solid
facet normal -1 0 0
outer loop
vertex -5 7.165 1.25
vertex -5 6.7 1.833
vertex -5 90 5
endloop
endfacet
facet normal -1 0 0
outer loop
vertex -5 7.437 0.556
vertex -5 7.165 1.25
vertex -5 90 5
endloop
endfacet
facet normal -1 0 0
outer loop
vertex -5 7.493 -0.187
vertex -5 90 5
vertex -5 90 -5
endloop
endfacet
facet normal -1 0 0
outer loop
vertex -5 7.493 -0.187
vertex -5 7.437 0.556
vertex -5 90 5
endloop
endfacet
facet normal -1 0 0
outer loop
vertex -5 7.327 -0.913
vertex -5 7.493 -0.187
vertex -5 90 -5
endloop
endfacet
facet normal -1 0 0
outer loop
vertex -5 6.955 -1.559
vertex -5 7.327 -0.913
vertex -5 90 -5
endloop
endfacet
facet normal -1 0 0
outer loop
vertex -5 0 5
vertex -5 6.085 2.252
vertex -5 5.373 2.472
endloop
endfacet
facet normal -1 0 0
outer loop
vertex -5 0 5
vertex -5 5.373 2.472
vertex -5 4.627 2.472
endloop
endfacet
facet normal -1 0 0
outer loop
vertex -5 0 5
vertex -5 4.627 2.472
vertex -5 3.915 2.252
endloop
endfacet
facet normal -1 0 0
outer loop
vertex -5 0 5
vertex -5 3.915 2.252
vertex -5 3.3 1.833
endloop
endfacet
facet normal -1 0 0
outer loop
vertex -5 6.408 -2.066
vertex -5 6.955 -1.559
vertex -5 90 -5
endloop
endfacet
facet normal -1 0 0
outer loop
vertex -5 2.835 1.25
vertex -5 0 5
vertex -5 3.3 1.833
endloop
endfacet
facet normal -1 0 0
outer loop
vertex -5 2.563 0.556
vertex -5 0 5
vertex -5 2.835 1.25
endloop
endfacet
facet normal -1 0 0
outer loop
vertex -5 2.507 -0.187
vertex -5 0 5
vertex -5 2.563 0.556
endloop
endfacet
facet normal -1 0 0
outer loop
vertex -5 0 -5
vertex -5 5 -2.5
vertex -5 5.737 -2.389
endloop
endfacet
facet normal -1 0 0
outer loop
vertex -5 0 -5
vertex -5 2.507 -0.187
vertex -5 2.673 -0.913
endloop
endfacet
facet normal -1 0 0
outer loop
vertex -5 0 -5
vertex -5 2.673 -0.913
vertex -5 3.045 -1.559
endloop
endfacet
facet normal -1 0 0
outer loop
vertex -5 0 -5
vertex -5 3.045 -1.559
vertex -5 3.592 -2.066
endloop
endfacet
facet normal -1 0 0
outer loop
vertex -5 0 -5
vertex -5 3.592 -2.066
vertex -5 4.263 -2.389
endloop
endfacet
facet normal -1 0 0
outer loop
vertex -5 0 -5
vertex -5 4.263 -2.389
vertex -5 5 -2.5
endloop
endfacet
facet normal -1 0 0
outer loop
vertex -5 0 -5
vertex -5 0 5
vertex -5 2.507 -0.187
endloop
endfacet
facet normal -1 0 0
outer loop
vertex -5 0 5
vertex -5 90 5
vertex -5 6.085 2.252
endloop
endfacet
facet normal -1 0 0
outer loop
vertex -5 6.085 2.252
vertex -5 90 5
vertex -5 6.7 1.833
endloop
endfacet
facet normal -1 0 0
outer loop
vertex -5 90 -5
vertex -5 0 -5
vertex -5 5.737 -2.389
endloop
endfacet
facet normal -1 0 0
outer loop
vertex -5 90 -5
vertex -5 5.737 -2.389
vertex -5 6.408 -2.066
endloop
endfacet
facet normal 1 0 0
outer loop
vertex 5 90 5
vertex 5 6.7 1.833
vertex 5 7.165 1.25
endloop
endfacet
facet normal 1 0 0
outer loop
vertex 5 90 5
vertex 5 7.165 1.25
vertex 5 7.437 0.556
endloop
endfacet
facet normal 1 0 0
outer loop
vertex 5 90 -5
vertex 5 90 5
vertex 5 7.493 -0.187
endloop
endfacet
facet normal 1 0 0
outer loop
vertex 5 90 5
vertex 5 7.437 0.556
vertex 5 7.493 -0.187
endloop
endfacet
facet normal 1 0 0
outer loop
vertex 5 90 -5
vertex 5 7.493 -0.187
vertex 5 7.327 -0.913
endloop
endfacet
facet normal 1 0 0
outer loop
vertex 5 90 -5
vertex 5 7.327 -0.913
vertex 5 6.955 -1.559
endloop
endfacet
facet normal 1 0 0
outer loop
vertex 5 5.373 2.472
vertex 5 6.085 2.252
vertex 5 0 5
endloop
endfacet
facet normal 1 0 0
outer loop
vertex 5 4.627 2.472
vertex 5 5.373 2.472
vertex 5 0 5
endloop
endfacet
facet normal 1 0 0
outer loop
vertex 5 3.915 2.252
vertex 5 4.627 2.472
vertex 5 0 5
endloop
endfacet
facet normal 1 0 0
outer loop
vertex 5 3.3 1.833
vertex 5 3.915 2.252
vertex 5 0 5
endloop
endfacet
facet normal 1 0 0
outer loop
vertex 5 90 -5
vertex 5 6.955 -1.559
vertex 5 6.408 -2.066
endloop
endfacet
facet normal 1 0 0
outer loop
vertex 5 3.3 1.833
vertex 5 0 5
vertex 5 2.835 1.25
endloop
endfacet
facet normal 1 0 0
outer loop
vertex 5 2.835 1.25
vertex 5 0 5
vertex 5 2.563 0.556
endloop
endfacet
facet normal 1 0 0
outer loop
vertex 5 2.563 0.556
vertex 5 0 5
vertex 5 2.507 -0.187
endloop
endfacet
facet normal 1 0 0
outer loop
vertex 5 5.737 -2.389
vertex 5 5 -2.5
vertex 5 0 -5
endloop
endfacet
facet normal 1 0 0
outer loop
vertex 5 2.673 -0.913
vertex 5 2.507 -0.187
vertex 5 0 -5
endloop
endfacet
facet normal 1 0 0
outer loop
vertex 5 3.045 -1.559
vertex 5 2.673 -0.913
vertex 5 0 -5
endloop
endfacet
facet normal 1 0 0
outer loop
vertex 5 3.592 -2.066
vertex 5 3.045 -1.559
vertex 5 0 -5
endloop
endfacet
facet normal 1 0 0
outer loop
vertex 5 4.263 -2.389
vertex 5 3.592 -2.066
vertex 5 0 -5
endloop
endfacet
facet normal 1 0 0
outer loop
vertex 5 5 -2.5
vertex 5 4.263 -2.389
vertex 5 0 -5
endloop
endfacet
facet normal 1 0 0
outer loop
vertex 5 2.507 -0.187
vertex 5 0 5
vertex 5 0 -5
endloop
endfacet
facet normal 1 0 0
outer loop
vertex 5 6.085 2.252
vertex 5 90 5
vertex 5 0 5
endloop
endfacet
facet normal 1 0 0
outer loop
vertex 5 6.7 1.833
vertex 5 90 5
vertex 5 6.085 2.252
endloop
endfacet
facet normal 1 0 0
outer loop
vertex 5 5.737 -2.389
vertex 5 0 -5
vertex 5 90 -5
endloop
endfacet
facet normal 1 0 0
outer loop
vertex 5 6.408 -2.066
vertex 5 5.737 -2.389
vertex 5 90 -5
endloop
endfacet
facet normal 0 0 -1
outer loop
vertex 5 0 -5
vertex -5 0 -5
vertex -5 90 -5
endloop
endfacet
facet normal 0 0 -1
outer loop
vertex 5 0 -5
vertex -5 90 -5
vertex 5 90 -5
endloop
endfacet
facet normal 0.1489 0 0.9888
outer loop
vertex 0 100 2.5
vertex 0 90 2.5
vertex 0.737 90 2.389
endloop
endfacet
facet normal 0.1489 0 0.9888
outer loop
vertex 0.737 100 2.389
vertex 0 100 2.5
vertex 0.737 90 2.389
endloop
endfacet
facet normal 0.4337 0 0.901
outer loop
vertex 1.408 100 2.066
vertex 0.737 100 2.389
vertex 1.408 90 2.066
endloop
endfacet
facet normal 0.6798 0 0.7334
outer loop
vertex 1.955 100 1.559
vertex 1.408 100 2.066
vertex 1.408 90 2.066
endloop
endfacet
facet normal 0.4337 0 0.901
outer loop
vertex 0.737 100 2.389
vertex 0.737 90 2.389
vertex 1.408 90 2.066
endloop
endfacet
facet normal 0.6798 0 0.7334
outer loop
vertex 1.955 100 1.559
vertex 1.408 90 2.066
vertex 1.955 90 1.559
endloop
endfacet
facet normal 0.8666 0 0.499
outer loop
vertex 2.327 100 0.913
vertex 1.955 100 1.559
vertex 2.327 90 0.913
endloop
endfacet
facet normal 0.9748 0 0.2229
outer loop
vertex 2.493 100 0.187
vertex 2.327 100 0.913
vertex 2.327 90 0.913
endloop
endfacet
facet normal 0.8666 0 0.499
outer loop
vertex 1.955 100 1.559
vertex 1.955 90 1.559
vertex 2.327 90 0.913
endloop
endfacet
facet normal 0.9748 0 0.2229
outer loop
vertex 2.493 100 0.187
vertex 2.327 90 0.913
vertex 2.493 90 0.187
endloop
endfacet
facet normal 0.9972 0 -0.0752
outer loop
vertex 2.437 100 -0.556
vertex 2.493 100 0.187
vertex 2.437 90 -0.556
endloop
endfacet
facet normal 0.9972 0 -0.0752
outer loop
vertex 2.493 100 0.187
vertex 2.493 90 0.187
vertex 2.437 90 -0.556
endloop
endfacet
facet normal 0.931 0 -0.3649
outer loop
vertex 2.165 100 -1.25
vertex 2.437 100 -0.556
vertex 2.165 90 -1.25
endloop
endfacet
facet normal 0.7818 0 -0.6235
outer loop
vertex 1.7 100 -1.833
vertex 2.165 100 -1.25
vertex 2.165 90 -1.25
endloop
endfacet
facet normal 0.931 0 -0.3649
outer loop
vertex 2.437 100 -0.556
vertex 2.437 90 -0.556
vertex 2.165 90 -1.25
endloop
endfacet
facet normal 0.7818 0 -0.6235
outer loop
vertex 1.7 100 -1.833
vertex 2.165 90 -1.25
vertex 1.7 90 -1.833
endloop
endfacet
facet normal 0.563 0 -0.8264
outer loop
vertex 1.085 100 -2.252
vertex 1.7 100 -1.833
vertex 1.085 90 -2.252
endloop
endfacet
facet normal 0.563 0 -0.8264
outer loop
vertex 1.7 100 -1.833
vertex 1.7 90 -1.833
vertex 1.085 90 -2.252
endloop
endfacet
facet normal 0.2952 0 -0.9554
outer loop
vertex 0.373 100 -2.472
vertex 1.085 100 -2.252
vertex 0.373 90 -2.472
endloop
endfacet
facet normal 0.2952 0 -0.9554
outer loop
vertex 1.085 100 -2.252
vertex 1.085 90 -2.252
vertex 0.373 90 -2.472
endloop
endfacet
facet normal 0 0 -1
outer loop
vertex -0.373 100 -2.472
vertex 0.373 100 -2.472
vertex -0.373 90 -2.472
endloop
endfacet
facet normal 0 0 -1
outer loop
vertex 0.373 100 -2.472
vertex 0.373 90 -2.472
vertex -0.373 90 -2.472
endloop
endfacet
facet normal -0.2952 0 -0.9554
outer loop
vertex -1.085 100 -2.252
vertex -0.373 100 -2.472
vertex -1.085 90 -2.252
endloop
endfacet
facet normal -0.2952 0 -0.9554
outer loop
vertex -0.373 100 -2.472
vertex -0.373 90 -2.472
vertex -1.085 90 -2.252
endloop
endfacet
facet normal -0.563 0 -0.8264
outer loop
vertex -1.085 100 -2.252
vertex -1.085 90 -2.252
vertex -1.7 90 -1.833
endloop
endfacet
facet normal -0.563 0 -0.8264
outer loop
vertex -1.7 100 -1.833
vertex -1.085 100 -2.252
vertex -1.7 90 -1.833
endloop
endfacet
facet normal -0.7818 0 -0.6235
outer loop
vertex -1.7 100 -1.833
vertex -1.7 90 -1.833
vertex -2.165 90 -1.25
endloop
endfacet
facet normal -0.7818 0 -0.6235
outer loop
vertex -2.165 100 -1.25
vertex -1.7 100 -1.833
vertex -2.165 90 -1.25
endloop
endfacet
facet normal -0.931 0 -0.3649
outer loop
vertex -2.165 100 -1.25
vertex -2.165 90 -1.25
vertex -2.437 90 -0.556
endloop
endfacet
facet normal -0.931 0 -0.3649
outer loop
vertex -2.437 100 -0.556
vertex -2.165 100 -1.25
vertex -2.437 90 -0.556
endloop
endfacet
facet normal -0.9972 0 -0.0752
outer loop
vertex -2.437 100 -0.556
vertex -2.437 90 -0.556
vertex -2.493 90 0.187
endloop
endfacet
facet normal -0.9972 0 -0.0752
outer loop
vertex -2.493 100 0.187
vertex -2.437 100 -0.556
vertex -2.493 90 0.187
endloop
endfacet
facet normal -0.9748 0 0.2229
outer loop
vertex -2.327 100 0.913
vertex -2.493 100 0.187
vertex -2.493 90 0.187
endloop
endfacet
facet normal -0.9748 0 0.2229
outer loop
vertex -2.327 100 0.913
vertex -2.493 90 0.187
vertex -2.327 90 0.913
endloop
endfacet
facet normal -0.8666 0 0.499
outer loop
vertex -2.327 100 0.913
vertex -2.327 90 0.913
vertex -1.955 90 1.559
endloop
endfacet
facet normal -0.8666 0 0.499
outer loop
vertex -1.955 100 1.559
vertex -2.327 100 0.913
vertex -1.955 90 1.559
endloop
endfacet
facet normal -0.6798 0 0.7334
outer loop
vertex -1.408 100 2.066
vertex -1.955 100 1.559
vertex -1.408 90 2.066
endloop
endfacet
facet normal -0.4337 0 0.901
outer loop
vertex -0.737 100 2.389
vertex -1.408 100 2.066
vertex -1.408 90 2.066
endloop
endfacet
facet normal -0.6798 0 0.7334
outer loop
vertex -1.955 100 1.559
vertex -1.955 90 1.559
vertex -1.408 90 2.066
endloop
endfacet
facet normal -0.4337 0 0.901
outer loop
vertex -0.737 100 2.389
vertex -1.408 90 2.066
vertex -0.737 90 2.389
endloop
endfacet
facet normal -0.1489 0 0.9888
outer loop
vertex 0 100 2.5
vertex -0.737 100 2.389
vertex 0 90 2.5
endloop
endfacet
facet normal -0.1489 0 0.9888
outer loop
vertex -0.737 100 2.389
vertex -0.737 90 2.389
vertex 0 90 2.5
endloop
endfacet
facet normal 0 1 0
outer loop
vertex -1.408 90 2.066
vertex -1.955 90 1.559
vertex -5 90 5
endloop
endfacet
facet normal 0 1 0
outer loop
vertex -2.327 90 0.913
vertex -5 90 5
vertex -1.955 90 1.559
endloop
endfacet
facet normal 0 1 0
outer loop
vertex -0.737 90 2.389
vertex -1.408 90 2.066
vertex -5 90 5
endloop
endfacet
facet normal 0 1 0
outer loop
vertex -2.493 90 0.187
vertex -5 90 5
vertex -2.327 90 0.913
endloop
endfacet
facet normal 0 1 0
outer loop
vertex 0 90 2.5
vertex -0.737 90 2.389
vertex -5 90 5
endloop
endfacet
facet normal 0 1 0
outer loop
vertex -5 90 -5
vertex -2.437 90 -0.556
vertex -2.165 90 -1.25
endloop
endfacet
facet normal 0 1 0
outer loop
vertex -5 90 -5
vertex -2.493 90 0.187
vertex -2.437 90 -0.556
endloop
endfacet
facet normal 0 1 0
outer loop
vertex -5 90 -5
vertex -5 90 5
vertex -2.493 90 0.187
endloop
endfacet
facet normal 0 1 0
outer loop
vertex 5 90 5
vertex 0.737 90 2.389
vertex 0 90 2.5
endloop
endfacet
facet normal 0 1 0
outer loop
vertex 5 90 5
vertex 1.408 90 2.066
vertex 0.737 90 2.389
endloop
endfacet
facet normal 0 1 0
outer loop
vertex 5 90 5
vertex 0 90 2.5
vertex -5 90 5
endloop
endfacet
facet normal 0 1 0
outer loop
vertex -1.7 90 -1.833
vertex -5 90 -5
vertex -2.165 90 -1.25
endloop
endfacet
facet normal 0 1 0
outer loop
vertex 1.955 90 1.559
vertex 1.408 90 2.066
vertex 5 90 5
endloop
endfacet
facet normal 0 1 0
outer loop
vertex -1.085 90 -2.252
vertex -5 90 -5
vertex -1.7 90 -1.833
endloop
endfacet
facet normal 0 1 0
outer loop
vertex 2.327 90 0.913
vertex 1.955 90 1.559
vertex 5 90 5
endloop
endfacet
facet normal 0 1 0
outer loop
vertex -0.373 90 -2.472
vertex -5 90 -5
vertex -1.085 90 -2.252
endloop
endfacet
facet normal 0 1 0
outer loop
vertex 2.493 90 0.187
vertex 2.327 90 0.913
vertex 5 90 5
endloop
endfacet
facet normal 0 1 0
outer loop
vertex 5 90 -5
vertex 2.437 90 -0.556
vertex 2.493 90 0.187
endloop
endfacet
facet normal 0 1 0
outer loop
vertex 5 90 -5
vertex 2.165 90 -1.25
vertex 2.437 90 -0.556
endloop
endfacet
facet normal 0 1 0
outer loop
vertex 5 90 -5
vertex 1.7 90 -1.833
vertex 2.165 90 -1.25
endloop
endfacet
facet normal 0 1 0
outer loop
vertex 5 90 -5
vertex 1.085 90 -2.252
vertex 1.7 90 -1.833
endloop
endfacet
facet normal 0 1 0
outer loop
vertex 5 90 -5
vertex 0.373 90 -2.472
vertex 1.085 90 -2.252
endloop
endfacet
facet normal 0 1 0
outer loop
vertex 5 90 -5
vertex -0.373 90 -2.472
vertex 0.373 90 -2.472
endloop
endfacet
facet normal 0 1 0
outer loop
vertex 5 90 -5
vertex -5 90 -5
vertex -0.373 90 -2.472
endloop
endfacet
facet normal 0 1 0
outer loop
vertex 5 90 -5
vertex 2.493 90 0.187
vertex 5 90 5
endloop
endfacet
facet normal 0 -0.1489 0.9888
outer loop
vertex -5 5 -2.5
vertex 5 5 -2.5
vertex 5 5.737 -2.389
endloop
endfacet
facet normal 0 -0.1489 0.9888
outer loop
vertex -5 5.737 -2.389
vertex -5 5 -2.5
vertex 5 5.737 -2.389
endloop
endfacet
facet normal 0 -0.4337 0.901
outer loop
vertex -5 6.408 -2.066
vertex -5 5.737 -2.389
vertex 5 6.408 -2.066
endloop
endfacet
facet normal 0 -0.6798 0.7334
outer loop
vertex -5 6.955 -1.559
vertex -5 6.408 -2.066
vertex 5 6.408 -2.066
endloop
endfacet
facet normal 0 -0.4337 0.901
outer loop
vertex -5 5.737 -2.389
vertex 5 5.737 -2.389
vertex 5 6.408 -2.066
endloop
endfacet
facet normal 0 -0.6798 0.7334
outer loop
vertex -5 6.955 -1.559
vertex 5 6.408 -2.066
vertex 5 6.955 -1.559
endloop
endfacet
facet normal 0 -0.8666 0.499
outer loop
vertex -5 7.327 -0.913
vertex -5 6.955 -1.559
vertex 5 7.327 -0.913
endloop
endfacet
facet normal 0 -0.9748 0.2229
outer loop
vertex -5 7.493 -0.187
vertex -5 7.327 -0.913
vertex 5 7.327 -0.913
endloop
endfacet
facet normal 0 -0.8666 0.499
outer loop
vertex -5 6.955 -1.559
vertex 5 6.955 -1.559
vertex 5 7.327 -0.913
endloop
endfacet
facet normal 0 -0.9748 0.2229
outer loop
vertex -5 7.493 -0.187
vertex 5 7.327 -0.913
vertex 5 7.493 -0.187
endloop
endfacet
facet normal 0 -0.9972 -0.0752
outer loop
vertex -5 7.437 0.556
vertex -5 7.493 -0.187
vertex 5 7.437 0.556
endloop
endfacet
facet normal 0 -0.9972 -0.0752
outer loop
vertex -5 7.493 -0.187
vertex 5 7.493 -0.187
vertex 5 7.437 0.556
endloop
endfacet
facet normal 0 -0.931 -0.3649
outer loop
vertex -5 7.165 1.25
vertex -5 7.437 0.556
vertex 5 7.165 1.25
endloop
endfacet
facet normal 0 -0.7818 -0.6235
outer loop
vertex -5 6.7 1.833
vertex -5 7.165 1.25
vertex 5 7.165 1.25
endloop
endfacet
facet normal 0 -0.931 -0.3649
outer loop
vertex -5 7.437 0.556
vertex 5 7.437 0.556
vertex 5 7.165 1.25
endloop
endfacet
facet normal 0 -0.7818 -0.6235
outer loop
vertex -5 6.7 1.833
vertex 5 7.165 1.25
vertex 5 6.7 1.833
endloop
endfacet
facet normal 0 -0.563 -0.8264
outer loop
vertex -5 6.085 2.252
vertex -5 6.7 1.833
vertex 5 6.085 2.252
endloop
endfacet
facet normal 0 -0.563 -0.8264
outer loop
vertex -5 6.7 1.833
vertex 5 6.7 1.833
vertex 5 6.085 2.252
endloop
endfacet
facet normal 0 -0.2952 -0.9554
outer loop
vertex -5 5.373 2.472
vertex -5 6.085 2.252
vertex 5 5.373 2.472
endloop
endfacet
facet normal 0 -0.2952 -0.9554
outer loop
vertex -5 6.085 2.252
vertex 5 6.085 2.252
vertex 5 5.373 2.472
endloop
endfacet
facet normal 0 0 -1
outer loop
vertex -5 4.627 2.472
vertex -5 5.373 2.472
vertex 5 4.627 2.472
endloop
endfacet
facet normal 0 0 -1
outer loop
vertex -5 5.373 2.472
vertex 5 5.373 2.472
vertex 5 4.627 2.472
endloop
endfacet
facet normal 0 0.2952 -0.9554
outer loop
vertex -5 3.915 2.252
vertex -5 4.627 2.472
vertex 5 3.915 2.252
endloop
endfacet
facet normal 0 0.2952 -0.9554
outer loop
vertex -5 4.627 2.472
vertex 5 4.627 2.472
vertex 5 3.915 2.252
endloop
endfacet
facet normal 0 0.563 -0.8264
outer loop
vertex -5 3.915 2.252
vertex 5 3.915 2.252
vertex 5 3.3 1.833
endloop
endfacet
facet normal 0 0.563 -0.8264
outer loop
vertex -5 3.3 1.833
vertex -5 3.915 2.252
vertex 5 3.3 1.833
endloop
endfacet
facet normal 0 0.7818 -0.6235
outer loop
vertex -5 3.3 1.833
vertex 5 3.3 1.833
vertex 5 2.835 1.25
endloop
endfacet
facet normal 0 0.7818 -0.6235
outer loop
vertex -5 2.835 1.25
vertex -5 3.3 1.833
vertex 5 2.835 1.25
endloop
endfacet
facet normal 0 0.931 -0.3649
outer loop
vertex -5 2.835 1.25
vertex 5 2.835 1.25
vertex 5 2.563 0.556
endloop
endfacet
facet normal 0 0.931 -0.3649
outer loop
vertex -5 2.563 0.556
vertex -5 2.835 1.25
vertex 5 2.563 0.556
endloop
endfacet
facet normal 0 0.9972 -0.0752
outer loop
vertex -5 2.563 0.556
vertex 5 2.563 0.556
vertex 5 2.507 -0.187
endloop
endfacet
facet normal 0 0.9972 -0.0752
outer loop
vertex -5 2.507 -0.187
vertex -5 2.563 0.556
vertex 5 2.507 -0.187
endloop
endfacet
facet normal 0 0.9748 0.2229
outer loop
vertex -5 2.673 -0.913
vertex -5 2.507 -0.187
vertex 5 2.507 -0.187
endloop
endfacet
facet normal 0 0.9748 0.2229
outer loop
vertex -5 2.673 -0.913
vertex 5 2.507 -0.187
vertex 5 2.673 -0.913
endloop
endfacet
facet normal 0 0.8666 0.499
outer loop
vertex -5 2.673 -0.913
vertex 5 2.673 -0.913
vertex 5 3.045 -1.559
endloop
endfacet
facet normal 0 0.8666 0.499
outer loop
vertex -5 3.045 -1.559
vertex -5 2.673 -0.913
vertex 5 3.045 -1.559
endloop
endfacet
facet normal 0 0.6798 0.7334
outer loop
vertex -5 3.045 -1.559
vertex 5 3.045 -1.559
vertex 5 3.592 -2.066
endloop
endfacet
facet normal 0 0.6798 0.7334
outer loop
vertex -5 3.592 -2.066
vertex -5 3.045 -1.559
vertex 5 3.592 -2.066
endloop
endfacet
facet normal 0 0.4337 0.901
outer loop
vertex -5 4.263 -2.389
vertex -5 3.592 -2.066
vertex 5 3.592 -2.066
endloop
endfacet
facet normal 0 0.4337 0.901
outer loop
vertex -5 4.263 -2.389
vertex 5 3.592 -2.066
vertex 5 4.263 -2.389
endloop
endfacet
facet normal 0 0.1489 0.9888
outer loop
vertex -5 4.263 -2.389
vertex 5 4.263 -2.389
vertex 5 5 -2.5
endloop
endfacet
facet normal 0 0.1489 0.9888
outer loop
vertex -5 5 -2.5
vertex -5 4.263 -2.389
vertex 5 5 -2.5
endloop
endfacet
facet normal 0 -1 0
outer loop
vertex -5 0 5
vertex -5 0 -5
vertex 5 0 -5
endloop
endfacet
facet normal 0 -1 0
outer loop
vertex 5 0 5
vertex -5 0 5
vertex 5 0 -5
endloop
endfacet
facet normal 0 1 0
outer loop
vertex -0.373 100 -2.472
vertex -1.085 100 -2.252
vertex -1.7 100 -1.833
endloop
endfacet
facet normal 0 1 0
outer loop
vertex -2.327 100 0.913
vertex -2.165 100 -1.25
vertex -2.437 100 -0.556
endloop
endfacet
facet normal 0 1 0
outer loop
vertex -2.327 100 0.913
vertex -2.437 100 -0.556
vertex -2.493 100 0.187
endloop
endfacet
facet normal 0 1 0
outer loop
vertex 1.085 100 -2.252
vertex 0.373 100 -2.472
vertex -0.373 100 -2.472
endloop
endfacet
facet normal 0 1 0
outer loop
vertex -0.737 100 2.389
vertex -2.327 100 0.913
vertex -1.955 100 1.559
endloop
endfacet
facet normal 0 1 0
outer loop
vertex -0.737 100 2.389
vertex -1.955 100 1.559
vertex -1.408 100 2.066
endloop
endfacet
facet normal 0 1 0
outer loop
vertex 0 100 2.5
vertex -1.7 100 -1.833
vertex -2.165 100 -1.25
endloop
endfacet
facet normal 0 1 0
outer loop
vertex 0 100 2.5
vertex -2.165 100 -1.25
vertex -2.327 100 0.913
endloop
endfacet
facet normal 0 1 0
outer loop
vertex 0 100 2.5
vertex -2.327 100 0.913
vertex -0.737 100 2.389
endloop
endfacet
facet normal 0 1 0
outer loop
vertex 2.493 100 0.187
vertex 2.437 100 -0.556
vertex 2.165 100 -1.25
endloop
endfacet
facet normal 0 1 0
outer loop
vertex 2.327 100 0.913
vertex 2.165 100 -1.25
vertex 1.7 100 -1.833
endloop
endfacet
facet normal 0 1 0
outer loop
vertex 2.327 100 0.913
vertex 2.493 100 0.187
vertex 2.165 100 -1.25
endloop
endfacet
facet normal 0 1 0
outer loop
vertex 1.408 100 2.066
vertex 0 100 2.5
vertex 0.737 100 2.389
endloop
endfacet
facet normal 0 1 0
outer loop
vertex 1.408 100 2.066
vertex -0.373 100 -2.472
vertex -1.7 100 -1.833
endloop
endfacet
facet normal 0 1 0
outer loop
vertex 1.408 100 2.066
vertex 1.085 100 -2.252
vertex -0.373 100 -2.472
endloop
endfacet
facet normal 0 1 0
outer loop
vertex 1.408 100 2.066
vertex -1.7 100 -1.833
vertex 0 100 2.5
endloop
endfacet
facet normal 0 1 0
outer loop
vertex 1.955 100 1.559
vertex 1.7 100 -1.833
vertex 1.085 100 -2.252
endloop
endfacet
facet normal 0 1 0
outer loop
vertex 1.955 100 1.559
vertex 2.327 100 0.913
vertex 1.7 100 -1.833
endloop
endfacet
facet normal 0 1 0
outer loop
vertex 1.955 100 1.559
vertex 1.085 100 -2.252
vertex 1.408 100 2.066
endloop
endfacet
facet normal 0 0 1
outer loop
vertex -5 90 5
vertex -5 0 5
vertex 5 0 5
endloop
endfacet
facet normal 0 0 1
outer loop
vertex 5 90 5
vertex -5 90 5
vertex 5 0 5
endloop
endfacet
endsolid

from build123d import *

# Parameters (mm, degrees)
SKETCH1_W           = 10
SKETCH1_H           = 10
BOSS_EXTRUDE1_DEPTH = 90
SKETCH2_R           = 2.5
BOSS_EXTRUDE2_DEPTH = 10
SKETCH3_R           = 2.5
CUT_EXTRUDE1_DEPTH  = 101.623058987


with BuildPart() as part:
    # Sketch1 → Boss-Extrude1 (new body)
    with BuildSketch(Plane(origin=(0, 0, 0), x_dir=(1, 0, 0), z_dir=(0, 1, 0))):
        Rectangle(SKETCH1_W, SKETCH1_H)
    extrude(amount=BOSS_EXTRUDE1_DEPTH)

    # Sketch2 → Boss-Extrude2 (add)
    with BuildSketch(Plane(origin=(0, 90, 0), x_dir=(1, 0, 0), z_dir=(0, 1, 0))):
        with Locations(Location((0, 0, 0), (0, 0, 270))):
            Circle(SKETCH2_R)
    extrude(amount=BOSS_EXTRUDE2_DEPTH)

    # Sketch3 → Cut-Extrude1 (cut, through all)
    with BuildSketch(Plane(origin=(5, 0, 0), x_dir=(0, 0, -1), z_dir=(1, 0, 0))):
        with Locations((0, 5)):
            Circle(SKETCH3_R)
    extrude(amount=-CUT_EXTRUDE1_DEPTH, mode=Mode.SUBTRACT)


solid = part.part
